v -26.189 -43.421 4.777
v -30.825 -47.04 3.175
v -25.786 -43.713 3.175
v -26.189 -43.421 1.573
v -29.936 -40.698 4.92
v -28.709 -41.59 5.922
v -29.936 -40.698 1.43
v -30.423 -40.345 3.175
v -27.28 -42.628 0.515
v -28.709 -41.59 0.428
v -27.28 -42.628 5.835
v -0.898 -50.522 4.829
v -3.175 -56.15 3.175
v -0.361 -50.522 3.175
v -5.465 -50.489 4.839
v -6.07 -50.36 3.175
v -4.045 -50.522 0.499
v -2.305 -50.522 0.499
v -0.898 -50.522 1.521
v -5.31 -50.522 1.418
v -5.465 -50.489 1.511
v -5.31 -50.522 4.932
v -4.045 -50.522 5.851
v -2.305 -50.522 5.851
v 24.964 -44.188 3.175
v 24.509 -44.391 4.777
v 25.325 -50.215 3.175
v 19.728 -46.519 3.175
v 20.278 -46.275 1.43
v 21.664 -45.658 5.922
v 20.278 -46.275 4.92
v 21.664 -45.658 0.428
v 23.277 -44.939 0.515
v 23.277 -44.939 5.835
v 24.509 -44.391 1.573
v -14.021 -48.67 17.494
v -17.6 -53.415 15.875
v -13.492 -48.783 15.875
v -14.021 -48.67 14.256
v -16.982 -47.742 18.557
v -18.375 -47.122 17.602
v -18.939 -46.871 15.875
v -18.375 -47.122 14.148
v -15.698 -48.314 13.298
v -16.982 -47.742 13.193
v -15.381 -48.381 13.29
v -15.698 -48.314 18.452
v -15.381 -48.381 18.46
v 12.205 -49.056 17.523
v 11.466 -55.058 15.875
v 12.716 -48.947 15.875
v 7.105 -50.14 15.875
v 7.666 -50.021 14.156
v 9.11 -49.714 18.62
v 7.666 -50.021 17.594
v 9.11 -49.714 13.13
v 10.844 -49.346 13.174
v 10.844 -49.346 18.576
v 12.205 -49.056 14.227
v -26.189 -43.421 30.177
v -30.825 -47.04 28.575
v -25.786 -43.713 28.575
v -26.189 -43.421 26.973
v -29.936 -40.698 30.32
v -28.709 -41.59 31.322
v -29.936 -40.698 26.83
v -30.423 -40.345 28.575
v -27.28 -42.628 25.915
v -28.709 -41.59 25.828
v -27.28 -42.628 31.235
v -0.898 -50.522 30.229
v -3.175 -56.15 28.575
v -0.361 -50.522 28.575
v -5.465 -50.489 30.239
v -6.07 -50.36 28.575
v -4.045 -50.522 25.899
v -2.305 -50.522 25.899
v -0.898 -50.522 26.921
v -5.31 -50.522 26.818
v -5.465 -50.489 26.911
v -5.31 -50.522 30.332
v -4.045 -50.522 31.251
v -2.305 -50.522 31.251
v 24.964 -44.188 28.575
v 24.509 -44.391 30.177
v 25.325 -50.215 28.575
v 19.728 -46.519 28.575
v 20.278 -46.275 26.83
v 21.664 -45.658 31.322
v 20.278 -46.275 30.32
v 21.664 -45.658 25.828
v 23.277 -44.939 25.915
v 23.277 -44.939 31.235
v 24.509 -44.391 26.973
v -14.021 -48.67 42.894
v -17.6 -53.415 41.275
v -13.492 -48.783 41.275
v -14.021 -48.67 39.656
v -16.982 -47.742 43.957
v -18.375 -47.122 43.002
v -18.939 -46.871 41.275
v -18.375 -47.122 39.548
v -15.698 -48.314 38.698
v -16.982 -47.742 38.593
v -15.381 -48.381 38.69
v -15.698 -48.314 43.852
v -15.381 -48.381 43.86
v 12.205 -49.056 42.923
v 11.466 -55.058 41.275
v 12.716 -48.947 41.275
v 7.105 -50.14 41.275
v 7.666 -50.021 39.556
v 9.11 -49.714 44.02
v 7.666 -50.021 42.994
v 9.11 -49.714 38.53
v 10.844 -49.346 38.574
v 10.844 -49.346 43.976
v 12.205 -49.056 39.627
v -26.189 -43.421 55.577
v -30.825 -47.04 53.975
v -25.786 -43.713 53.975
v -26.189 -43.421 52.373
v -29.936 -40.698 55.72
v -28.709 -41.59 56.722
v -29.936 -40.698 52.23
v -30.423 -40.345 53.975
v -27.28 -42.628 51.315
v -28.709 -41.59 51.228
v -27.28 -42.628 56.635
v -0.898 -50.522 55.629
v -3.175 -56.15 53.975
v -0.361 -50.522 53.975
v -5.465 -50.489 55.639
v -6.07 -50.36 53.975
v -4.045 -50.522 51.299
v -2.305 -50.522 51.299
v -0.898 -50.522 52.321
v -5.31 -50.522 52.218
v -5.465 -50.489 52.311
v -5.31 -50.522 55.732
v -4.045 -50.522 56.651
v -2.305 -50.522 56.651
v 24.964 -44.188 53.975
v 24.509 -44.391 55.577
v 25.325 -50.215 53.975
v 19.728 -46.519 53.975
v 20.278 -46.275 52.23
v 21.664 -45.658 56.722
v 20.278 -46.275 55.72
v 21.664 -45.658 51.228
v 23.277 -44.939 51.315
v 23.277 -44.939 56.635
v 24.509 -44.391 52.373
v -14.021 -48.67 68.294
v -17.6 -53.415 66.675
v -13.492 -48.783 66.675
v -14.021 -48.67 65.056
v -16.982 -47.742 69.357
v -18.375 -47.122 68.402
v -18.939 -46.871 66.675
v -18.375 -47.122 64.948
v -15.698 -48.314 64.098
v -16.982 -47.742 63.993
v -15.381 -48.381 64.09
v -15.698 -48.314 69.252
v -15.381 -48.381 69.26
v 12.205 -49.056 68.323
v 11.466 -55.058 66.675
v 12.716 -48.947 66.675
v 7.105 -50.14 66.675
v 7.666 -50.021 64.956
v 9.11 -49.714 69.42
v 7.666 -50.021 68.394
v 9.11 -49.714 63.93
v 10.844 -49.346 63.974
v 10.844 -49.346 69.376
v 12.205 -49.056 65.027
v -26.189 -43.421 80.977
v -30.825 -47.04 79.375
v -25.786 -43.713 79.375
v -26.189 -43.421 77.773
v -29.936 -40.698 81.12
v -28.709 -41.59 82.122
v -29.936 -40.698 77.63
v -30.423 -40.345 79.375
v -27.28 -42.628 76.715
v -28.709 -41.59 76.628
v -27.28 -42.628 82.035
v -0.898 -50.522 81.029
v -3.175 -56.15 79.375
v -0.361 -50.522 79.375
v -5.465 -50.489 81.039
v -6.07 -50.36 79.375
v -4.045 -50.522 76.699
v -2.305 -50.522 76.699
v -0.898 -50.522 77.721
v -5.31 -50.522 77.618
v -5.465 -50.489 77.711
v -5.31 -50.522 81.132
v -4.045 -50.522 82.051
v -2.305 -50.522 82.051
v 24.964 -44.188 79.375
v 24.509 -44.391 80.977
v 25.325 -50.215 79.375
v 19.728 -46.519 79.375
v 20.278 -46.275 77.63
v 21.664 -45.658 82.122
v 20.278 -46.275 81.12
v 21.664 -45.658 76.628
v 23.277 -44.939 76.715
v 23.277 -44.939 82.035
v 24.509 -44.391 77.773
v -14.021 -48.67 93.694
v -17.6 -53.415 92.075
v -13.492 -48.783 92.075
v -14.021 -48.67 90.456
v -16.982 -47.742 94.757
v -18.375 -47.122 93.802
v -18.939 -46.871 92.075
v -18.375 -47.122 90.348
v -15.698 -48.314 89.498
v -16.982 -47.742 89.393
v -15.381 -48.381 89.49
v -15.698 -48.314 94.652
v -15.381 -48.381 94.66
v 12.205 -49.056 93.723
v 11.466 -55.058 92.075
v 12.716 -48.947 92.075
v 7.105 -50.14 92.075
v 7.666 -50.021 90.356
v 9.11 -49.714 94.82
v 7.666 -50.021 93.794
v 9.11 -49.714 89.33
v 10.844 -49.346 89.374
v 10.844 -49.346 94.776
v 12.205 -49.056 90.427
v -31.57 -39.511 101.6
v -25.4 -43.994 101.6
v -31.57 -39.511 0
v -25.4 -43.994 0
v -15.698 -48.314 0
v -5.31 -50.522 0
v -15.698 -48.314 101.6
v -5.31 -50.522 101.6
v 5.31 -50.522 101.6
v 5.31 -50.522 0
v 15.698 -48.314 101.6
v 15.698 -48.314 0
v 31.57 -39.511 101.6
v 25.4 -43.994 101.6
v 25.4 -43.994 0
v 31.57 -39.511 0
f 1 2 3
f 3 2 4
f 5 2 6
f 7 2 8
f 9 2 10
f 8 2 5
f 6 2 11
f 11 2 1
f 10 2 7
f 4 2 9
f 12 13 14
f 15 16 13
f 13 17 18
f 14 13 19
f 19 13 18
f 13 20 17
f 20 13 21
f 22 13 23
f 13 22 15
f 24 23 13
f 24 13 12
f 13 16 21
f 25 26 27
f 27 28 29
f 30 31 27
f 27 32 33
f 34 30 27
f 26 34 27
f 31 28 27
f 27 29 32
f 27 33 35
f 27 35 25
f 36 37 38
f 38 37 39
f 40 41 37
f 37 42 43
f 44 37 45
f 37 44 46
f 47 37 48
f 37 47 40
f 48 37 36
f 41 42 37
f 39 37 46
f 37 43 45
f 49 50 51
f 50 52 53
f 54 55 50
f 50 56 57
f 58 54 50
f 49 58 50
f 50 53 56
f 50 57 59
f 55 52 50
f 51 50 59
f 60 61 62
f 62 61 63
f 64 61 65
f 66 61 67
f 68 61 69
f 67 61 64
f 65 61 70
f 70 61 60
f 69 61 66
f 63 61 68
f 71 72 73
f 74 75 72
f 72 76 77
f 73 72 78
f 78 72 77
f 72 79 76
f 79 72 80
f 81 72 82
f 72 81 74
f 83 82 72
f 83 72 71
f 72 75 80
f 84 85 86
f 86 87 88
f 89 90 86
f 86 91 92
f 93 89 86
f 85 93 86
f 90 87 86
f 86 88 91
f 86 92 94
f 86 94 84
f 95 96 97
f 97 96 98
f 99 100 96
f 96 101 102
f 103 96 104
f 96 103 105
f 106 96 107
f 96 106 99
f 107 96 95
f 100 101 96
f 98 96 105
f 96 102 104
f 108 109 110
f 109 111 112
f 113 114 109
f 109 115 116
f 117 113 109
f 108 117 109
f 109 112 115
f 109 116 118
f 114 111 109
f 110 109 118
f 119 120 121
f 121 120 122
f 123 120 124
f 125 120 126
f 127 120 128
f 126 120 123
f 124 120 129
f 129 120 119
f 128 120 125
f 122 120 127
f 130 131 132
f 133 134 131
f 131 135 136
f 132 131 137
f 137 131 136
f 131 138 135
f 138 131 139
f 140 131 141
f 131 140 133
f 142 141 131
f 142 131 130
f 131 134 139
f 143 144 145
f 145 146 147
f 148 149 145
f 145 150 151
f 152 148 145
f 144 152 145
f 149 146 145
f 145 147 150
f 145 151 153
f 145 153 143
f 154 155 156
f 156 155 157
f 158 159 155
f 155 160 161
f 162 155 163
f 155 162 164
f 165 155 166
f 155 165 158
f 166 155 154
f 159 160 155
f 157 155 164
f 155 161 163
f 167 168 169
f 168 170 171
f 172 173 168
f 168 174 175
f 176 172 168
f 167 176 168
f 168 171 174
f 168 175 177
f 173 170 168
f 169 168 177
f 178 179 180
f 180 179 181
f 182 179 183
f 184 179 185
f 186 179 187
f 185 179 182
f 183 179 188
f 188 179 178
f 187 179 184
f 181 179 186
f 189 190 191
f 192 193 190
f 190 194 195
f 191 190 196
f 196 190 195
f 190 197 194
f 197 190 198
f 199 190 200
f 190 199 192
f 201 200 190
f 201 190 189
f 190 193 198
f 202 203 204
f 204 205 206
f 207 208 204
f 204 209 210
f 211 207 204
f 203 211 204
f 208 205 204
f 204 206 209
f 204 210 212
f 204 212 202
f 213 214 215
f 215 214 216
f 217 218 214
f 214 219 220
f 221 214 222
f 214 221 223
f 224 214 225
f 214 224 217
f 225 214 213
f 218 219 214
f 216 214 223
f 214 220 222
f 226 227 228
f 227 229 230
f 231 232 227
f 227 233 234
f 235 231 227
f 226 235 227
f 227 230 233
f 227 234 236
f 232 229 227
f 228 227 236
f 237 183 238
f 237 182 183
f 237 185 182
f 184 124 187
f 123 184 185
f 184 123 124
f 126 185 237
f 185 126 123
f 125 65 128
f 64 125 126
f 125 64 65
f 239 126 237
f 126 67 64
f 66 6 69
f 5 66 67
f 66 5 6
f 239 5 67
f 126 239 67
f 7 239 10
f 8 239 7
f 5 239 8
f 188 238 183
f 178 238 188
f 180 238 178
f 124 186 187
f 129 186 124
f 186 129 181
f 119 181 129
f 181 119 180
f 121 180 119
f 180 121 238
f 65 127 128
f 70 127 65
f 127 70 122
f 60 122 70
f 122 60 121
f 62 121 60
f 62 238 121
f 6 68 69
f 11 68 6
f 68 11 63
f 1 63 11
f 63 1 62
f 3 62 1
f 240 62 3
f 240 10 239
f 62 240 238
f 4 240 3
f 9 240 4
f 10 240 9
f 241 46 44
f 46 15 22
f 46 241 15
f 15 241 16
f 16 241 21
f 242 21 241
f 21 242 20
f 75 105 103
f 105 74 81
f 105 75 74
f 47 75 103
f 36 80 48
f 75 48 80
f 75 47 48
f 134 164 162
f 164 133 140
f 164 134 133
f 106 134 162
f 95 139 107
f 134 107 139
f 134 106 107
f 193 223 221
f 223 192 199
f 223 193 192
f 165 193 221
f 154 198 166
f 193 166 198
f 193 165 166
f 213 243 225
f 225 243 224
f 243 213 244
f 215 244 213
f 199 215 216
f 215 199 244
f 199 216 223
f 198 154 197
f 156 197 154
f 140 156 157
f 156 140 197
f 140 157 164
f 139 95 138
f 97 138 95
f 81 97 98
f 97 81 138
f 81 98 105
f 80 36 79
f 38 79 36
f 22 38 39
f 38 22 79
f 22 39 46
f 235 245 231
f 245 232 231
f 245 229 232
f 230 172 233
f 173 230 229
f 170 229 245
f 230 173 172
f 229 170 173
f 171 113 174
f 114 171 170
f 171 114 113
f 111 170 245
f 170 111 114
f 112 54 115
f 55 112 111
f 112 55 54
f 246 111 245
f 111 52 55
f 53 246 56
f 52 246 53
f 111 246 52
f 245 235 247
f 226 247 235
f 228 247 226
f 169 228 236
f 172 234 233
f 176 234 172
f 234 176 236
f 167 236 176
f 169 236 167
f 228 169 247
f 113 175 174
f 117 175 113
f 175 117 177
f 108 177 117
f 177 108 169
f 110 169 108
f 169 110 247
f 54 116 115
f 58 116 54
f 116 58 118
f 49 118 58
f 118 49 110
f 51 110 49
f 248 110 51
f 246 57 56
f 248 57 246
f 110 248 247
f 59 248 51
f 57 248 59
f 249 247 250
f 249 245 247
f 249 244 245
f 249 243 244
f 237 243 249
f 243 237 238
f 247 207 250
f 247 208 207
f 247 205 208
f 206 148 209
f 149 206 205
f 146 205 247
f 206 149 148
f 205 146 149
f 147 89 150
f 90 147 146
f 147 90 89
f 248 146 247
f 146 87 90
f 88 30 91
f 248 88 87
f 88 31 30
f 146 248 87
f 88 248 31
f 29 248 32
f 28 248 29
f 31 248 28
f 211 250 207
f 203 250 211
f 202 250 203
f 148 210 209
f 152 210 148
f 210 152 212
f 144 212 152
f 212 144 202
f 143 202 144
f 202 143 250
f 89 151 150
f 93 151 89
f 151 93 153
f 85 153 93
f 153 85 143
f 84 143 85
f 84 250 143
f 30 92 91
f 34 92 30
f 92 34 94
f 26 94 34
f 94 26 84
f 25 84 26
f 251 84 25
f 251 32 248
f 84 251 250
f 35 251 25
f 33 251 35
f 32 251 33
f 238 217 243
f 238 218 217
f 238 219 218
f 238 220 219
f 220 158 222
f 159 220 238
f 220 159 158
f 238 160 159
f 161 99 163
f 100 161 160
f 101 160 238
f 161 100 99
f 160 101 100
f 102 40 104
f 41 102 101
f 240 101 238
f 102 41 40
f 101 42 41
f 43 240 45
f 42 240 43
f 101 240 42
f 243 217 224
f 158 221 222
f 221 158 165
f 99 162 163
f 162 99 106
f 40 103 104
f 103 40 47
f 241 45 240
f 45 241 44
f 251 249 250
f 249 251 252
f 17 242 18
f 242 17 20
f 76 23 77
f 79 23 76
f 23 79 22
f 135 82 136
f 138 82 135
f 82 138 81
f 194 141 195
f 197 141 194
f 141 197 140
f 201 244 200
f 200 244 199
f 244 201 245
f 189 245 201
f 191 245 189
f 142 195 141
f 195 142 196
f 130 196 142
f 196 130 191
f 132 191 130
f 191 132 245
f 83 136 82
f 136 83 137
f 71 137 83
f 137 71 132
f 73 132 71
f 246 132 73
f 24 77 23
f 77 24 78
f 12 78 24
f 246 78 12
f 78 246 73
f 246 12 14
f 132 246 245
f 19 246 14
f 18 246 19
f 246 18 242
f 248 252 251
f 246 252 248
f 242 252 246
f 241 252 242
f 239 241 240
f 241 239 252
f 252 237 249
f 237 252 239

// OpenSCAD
length=4;
radius=2;
toothHeight=.25;
toothAngle=30;
toothDist=.5;

function mm(i) = i*25.4;


module tooth()
{
	rotate([0,0,-90+toothAngle*2])
	{	
		translate([-mm(toothHeight)/2, -mm(radius)+1, mm(toothHeight)/2])
		{
			rotate([90,0,0])
			{
				cylinder(mm(toothHeight),mm(toothHeight)/2 ,0, 0);
			}
		}
	}
}


module teeth1()
{
	for ( j=[0:round((60/toothAngle))])
	{
		rotate( j * toothAngle, [0, 0, 1])
		{
			tooth();
		}
	}
}

//teeth1();

module teeth2()
{
	for (k=[0:round((40/toothAngle))])
	{
		rotate(toothAngle/2+k * toothAngle, [0, 0, 1])
		{
			tooth();
		}
	}
}

//teeth2();

module teeth()
{
	tmpValue = (mm(length)/mm(toothDist));
	echo(tmpValue );
	for(i=[0:tmpValue/2-1])
	{
		translate( [0, 0, mm((toothDist*2)*i)])
		{
			teeth1();
		}
		
		translate( [0, 0, mm((toothDist*2)*i)+mm(toothDist)])
		{
			teeth2();
		}
	}
}

teeth();





module gripper()
{
	difference()
	{
		cylinder(mm(length), mm(radius), mm(radius), 0);
		translate([-mm(radius)-1, -mm(radius)+mm(radius/4.5), -1])
		{
			cube([mm(radius)*2+2, mm(radius)*2, mm(length)+2]);
		}
	}
}

gripper();
